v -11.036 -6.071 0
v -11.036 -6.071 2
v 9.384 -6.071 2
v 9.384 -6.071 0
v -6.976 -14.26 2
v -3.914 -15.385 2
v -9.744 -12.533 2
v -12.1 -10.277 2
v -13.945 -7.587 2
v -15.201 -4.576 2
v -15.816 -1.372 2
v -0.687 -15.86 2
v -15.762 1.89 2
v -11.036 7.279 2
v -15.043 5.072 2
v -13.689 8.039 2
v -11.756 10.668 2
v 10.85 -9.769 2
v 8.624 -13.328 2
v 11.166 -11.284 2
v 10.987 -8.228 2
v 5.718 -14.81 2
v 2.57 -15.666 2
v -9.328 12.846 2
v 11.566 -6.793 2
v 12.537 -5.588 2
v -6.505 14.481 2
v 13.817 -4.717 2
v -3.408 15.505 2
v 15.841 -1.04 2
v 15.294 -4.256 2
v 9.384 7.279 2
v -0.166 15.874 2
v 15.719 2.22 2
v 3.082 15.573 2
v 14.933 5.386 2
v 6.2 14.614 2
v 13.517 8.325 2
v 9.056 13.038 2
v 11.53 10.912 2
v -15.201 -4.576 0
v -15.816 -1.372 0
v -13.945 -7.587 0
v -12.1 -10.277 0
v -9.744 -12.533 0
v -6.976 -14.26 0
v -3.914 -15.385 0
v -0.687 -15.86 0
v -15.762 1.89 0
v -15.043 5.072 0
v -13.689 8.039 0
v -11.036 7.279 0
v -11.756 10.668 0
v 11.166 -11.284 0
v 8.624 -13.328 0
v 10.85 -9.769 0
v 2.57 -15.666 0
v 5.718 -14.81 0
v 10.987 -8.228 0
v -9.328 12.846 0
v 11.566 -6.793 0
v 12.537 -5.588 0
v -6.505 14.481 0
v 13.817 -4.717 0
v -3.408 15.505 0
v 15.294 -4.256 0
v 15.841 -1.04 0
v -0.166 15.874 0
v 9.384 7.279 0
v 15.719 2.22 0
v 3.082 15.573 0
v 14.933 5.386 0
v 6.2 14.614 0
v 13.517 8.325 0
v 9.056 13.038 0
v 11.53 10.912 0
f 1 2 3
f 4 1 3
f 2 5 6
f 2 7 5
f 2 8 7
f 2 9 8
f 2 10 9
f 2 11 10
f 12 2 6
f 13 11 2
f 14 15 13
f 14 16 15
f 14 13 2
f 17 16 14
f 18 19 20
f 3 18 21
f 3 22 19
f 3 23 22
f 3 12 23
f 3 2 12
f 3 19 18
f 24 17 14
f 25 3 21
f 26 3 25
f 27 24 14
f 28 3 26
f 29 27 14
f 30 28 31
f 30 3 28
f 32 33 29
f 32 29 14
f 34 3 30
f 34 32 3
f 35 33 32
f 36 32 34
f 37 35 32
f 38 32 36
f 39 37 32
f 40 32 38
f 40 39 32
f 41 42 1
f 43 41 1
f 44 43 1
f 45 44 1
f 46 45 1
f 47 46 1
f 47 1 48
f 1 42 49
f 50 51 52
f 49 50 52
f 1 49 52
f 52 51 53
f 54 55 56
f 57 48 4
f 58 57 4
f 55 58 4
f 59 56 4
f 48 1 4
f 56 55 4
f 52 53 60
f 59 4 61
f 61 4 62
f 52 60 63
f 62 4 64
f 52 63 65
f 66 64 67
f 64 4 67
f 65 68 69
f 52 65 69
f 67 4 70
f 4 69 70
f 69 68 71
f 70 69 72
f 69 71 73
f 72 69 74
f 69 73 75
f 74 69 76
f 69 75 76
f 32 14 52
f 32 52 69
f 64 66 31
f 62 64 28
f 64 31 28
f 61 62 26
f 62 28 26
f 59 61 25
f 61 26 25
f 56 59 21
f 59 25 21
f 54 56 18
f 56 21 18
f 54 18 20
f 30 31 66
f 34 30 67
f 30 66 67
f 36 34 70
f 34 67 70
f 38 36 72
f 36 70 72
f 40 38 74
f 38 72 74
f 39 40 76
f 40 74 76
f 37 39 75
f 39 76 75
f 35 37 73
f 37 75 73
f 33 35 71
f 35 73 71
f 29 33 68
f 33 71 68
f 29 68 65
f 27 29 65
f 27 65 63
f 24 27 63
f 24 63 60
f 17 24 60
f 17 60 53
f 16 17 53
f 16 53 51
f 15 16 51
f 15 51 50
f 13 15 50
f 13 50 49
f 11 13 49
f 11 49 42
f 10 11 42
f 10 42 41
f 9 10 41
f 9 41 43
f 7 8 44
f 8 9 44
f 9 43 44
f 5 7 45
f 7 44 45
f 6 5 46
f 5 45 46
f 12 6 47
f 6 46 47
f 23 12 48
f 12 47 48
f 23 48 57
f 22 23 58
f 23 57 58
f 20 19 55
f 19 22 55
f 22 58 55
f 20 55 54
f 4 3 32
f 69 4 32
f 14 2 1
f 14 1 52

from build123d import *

# Parameters (mm, degrees)
F0_R     = 15.875
F1_DEPTH = 2
F2_W     = 20.42
F2_H     = 13.35
F3_DEPTH = 2
F4_R     = 5.26728
F5_DEPTH = 5


with BuildPart() as f1:
    # F0 (on Top) → F1 (new body)
    with BuildSketch(Plane.XY):
        Circle(F0_R)
    extrude(amount=F1_DEPTH)

    # F2 (on face) → F3 (cut)
    with BuildSketch(Plane.XY.offset(2)):
        with Locations((-0.826221, 0.604355)):
            Rectangle(F2_W, F2_H)
    extrude(amount=-F3_DEPTH, mode=Mode.SUBTRACT)

    # F4 (on face) → F5 (cut)
    with BuildSketch(Plane.XY.offset(2)):
        with Locations((16.107954, -9.460228)):
            Circle(F4_R)
    extrude(amount=-F5_DEPTH, mode=Mode.SUBTRACT)


solid = f1.part
